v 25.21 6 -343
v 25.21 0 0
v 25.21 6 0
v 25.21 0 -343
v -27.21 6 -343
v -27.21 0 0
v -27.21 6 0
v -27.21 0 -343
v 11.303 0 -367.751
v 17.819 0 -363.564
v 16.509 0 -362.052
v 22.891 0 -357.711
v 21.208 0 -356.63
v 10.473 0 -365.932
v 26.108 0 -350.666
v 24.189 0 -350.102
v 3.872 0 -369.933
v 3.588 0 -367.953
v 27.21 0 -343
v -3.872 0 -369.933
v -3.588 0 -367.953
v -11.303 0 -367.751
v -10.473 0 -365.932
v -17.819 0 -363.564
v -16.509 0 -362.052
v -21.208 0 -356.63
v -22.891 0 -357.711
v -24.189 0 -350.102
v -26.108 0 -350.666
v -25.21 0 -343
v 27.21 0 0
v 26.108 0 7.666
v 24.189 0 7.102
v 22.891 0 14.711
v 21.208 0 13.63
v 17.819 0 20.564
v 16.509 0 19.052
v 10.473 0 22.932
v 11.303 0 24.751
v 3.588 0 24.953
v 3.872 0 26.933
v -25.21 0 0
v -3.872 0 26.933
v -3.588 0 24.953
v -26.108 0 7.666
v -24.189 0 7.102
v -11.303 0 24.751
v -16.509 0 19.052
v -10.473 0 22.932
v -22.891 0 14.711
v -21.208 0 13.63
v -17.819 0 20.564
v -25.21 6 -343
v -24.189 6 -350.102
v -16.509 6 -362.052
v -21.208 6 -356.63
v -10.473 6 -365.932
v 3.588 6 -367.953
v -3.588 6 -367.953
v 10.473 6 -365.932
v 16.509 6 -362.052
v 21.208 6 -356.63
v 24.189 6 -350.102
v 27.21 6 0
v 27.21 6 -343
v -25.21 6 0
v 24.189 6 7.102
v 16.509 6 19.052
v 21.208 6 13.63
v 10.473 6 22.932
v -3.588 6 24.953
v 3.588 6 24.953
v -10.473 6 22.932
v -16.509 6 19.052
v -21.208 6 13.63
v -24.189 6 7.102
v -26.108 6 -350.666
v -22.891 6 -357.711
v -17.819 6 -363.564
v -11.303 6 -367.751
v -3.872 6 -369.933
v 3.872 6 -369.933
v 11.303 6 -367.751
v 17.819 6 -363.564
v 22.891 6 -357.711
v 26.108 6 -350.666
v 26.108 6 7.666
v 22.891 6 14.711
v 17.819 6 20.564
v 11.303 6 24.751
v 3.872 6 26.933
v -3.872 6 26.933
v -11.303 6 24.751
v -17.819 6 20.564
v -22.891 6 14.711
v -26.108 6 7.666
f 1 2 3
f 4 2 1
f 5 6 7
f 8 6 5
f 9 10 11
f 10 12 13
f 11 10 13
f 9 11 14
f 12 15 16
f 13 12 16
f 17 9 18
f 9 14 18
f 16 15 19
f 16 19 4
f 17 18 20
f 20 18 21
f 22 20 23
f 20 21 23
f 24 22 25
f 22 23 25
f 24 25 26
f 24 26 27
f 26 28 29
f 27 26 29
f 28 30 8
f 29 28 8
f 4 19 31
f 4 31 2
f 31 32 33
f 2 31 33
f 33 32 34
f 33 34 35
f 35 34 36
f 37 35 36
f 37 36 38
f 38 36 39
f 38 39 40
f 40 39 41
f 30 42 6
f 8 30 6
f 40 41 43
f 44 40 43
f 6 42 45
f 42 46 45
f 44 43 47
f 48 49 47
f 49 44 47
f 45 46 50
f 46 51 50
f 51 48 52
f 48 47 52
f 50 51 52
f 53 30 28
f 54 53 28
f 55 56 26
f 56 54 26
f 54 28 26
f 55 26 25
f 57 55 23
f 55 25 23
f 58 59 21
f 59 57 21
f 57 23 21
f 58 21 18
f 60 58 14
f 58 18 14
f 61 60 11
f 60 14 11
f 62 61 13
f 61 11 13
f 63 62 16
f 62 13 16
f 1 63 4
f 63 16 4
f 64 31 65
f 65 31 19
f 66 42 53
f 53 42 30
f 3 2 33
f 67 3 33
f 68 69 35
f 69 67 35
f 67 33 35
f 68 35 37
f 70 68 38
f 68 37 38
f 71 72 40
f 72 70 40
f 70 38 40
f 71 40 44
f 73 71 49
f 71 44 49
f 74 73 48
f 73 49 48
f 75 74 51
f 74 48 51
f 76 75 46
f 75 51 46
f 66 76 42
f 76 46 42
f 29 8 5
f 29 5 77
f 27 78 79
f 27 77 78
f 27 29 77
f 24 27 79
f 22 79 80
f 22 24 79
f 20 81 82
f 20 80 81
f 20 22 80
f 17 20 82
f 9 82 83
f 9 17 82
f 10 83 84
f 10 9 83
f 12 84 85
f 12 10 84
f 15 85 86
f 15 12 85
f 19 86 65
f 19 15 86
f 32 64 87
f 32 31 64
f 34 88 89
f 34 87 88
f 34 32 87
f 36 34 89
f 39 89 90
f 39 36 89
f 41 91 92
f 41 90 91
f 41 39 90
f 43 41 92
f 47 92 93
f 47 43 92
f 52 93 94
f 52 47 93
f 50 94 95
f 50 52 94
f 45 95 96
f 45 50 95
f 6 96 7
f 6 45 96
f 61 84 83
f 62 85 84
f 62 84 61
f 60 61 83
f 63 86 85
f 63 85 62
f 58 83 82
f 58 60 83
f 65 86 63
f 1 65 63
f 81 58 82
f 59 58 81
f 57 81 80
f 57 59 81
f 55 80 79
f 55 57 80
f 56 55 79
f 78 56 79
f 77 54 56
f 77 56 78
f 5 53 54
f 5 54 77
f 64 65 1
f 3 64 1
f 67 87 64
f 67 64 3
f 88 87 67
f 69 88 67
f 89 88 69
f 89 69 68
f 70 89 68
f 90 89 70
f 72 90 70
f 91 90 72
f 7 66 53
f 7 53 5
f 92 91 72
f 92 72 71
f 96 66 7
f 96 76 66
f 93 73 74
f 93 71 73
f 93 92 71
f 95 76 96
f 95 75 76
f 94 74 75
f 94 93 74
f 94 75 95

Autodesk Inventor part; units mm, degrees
ref_plane "YZ Plane" through (0, 0, 0) normal (1, 0, 0) x (0, 1, 0)
ref_plane "XZ Plane" through (0, 0, 0) normal (0, 1, 0) x (-1, 0, 0)
ref_plane "XY Plane" through (0, 0, 0) normal (0, 0, 1) x (1, 0, 0)
sketch "Sketch1" plane through (0, 0, 0) normal (0, 1, 0) x (-1, 0, 0)
  arc A0 (25.21, 0) -> (-25.21, 0) centre (0, 0) ccw
  arc A1 (27.21, 0) -> (-27.21, 0) centre (0, 0) ccw
  arc A2 (-25.21, -343) -> (25.21, -343) centre (0, -343) ccw
  arc A3 (-27.21, -343) -> (27.21, -343) centre (0, -343) ccw
  line L0 (0, 0) -> (0, -343) construction
  line L1 (27.21, 0) -> (27.21, -343)
  line L2 (-27.21, 0) -> (-27.21, -343)
  line L3 (25.21, 0) -> (25.21, -343)
  line L4 (-25.21, 0) -> (-25.21, -343)
  dimension "d0" = 343
  dimension "d1" = 50.42
  dimension "d2" = 50.42
  dimension "d3" = 2
  dimension "d4" = 2
extrude "Extrusion1" add sketch "Sketch1" along normal blind 6
properties part number "Belt"
